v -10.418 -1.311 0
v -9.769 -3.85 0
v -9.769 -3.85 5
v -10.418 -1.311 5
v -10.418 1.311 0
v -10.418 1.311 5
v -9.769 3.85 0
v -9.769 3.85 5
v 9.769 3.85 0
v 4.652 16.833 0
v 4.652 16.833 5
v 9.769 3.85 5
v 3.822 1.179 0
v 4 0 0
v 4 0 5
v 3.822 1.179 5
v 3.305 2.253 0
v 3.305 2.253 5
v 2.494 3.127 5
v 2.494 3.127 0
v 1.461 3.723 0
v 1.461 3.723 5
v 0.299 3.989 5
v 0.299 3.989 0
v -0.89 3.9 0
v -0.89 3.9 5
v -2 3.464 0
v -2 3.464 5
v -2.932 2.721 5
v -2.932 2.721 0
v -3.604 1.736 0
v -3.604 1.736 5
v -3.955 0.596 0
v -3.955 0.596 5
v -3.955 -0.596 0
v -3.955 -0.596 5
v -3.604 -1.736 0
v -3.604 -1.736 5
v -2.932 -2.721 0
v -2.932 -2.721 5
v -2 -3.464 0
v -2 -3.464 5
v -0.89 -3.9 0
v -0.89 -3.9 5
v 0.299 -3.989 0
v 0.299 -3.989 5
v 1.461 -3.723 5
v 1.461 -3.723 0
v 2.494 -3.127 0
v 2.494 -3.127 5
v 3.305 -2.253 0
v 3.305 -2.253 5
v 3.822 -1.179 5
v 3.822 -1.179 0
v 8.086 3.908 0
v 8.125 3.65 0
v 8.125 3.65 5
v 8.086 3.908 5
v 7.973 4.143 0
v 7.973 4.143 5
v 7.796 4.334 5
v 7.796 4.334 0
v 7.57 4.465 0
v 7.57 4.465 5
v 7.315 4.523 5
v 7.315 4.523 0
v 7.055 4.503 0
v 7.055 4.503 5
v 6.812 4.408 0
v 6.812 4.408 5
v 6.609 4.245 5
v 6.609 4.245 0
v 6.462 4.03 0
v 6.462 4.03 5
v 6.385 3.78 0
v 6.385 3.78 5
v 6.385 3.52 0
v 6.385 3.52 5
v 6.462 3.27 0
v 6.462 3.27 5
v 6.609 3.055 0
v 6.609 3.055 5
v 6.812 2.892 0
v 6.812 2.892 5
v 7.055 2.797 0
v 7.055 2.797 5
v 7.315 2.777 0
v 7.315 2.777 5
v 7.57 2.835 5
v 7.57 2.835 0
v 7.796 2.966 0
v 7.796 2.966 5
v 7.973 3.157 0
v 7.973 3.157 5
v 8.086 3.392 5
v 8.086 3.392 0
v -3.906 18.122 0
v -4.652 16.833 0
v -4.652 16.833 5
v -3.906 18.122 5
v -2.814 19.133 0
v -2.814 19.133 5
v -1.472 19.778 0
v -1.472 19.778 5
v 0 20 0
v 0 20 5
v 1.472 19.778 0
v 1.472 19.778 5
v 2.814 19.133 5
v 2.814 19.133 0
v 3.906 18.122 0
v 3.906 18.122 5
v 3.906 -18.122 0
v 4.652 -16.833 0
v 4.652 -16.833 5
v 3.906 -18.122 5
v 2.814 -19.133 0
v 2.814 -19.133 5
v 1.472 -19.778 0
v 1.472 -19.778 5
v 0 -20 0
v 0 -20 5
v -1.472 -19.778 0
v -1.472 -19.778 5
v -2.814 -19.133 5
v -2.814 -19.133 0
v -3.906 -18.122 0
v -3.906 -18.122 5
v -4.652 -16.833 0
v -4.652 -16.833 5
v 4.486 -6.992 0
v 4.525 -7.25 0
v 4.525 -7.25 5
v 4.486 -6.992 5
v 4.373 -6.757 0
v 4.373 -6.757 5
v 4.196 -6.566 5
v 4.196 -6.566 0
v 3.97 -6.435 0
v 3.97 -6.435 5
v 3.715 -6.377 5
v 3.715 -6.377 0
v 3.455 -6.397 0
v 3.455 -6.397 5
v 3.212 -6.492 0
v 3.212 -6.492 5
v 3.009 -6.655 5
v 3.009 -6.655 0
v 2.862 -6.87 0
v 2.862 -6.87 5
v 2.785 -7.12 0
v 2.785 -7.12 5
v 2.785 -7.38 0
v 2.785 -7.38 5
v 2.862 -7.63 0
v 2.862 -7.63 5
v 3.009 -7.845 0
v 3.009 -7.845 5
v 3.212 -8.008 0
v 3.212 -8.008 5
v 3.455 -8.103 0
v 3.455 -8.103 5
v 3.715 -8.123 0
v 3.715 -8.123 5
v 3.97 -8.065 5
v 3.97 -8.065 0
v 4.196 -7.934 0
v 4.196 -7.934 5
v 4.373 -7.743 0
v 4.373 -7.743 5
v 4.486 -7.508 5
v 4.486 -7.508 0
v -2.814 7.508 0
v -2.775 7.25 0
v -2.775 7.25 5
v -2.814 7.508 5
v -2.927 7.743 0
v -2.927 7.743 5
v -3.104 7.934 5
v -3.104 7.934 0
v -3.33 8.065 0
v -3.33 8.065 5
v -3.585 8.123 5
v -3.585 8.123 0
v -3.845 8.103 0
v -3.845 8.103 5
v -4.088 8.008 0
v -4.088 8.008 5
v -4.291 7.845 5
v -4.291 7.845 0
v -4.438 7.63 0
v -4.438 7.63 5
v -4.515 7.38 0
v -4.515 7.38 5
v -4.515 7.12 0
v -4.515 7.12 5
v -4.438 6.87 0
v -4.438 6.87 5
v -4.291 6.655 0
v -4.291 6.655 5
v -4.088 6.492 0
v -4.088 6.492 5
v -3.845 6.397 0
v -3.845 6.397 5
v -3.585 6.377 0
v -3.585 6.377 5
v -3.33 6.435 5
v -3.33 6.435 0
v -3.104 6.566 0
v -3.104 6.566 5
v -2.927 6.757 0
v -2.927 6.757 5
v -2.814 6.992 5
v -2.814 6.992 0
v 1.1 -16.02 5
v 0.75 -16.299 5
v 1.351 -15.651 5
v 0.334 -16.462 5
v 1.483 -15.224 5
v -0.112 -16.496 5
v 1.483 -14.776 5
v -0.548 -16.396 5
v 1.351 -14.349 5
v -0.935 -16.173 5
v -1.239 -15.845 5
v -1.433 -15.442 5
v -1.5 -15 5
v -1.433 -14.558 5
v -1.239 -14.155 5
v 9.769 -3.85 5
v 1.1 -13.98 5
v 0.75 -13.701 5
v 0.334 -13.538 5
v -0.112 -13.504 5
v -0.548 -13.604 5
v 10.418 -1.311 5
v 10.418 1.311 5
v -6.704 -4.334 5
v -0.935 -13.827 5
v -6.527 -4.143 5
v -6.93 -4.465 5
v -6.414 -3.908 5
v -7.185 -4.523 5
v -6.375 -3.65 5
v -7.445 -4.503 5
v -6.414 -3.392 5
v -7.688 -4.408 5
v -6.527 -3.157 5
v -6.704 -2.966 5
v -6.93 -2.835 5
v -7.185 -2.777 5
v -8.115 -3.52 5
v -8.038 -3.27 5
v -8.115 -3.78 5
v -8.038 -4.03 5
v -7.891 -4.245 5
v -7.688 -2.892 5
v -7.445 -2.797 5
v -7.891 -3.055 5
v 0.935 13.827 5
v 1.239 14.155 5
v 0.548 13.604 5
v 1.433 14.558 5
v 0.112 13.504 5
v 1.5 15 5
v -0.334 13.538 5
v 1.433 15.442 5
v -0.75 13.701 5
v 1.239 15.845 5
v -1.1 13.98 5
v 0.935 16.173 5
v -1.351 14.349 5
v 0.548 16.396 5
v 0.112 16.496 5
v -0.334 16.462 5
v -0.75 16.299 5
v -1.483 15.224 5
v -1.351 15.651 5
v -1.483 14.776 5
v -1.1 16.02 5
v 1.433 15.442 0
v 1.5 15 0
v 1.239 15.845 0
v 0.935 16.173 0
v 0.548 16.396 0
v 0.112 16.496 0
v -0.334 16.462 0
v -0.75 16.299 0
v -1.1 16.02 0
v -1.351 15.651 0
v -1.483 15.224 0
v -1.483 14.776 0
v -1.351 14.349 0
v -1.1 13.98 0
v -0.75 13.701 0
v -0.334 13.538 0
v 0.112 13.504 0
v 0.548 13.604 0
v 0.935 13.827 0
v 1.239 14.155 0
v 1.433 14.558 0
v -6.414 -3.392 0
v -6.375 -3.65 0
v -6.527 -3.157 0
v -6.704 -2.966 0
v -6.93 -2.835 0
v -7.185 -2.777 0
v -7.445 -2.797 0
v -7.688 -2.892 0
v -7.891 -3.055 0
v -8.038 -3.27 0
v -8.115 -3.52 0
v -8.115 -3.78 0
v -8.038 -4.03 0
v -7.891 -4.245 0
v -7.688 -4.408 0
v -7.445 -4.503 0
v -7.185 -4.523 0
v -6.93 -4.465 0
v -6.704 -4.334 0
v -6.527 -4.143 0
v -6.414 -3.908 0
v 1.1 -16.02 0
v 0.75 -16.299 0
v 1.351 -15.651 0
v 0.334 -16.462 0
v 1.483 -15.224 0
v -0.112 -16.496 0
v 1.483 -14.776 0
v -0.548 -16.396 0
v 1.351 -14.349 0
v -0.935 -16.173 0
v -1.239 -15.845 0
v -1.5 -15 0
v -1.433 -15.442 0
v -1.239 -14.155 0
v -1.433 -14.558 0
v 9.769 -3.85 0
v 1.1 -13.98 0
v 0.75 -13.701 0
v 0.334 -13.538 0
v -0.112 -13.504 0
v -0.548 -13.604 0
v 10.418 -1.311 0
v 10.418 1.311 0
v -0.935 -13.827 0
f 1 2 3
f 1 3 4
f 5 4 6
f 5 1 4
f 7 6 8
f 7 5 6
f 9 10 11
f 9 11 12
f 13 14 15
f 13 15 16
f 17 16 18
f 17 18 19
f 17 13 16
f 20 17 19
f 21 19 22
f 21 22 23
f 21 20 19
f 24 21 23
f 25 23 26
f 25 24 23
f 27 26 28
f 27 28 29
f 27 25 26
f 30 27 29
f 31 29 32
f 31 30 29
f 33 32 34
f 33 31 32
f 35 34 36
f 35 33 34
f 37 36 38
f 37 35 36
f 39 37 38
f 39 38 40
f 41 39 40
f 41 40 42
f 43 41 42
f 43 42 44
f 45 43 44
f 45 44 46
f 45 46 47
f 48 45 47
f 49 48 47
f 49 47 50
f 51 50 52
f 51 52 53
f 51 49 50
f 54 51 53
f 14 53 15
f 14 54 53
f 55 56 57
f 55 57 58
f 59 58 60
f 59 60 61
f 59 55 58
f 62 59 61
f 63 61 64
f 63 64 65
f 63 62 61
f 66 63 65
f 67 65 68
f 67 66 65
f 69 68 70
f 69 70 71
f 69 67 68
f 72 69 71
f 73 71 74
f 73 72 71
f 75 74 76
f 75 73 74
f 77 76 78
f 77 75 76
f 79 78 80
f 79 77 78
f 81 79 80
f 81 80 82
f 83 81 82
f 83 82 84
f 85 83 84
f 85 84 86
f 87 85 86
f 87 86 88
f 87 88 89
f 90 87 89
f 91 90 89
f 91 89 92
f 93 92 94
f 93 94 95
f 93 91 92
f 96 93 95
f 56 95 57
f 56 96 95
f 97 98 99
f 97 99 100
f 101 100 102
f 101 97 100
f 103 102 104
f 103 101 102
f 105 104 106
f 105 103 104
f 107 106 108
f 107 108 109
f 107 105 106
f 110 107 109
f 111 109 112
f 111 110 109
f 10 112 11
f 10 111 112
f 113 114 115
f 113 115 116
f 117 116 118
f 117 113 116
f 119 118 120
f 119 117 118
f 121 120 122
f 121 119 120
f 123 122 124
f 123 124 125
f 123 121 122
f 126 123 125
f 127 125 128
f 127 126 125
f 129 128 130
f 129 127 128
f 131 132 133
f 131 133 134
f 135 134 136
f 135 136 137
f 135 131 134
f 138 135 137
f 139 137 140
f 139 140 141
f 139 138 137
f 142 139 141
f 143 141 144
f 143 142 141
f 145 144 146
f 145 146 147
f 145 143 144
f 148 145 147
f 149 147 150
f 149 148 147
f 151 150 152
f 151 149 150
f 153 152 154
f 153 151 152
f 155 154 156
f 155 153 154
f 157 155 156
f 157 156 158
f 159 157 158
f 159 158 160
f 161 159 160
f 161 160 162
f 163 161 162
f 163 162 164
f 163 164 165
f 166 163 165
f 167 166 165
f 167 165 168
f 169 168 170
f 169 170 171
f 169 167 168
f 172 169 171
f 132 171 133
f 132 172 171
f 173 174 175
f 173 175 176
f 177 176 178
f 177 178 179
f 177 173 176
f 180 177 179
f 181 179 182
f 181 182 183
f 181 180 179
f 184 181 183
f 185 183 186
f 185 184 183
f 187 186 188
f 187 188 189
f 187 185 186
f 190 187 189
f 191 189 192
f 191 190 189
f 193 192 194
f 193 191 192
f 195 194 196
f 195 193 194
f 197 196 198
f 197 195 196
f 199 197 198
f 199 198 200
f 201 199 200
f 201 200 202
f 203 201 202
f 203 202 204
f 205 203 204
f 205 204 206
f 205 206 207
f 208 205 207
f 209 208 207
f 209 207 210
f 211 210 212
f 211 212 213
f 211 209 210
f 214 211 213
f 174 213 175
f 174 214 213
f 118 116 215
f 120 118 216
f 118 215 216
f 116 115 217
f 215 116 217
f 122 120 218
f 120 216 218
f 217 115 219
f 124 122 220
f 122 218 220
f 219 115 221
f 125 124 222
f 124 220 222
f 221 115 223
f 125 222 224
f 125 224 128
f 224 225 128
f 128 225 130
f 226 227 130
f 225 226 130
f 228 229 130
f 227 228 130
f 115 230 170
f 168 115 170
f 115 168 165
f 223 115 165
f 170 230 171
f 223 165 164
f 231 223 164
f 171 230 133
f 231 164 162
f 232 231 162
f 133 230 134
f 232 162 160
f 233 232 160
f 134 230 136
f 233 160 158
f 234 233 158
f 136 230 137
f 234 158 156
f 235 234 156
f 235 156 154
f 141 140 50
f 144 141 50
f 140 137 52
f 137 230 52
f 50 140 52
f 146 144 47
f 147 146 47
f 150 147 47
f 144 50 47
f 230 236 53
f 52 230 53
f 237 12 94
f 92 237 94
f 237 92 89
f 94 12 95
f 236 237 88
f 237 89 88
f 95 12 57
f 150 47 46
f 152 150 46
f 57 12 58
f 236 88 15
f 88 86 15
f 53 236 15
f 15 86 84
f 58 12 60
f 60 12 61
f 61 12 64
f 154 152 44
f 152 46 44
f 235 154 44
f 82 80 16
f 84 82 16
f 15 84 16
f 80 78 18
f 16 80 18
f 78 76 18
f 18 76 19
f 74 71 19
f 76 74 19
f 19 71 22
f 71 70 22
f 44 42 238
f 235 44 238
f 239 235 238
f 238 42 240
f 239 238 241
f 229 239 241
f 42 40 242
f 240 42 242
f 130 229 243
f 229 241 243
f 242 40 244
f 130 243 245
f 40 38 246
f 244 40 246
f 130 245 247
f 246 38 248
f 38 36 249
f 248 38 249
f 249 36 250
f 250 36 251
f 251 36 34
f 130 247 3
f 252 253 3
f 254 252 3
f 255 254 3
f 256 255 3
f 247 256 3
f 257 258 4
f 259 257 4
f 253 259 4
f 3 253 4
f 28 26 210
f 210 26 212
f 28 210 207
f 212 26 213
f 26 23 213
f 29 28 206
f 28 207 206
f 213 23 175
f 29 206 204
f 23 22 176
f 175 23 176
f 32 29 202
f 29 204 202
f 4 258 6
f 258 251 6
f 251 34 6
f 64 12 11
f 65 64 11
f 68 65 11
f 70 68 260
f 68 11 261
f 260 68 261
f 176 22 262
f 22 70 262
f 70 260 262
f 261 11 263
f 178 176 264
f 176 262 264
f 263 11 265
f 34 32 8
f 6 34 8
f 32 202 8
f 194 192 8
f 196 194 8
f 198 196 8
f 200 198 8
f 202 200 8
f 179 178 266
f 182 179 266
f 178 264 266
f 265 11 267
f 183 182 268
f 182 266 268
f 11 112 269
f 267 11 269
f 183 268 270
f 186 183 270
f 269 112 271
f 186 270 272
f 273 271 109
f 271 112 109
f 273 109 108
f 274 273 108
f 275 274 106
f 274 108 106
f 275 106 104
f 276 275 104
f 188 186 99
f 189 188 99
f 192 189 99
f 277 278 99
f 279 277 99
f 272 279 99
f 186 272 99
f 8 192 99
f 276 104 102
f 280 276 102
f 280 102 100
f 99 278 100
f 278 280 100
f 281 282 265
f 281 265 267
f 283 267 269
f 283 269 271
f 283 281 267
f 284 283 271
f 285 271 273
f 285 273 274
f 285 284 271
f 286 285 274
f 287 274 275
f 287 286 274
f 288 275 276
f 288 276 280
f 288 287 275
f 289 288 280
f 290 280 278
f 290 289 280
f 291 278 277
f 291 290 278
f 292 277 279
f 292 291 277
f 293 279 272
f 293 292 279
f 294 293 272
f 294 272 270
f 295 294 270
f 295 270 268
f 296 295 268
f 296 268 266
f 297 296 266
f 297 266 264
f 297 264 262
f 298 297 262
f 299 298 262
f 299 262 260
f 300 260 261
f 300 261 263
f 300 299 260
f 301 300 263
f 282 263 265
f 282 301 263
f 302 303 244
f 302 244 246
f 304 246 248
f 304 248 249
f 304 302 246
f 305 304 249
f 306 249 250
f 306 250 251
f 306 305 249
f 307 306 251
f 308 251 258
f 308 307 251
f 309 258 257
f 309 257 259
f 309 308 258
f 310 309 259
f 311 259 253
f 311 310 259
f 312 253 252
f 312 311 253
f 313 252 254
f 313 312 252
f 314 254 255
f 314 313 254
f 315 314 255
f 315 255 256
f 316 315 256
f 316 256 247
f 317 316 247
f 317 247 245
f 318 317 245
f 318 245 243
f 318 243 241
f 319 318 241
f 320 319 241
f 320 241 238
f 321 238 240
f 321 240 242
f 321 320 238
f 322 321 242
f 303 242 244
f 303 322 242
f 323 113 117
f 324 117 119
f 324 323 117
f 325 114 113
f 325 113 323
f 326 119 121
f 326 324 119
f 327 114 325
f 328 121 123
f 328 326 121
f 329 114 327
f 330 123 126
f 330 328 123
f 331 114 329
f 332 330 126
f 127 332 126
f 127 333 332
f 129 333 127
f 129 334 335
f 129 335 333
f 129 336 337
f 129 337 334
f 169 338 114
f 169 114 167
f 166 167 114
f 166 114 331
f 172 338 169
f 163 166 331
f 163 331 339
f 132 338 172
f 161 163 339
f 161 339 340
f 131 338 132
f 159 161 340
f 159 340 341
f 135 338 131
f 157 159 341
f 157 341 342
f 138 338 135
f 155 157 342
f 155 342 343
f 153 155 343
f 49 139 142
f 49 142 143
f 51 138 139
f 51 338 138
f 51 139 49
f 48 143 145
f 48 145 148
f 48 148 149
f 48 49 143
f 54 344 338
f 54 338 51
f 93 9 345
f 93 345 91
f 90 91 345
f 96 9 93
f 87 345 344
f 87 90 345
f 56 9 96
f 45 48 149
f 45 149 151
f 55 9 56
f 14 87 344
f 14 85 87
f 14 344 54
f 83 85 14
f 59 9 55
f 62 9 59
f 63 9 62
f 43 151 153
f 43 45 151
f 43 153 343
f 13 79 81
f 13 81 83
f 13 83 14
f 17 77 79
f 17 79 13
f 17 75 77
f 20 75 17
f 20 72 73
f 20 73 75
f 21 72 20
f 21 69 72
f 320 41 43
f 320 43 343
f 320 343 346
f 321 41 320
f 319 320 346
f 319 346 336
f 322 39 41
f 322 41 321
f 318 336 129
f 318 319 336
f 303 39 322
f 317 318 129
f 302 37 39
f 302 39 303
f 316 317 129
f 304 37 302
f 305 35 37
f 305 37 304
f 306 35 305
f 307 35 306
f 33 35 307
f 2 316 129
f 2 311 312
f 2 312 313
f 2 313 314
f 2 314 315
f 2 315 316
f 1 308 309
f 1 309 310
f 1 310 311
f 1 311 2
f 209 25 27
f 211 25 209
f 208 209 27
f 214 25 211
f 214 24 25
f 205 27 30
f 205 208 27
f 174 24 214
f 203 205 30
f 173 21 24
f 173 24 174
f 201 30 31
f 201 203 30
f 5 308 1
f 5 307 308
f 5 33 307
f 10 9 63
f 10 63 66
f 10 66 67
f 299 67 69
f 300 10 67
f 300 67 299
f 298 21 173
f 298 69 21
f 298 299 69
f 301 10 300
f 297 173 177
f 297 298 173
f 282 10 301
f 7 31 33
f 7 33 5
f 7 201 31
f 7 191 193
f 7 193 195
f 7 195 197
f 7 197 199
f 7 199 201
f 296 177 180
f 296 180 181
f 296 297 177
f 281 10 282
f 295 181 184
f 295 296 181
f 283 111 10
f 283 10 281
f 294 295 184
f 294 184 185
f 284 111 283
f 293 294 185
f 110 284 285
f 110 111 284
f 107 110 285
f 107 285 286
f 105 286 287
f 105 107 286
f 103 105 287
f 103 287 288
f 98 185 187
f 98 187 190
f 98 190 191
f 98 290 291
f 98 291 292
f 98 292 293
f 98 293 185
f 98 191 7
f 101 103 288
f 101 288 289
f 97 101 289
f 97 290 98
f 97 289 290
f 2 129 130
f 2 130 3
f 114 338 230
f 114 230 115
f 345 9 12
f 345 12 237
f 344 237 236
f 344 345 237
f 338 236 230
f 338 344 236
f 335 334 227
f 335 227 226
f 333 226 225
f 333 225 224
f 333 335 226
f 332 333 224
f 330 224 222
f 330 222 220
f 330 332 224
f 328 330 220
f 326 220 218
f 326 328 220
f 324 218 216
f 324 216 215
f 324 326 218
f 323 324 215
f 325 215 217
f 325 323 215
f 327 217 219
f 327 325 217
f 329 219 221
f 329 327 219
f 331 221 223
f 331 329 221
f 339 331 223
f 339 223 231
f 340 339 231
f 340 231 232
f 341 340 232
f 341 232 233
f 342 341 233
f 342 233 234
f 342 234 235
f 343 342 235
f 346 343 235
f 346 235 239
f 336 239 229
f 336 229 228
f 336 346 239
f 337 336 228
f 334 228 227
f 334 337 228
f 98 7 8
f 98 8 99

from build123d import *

# Parameters (mm, degrees)
ESQUISSE1_R        = 4
ESQUISSE1_R_2      = 0.875
ESQUISSE1_R_3      = 1.5
BOSS_EXTRU_1_DEPTH = 5


with BuildPart() as part:
    # Esquisse1 → Boss.-Extru.1 (new body)
    with BuildSketch(Plane.XY):
        with BuildLine():
            Line((-9.768700016, 3.85), (-4.651761912, 16.833333333))
            ThreePointArc((-4.651761912, 16.833333333), (0, 20), (4.651761912, 16.833333333))
            Line((4.651761912, 16.833333333), (9.768700016, 3.85))
            ThreePointArc((9.768700016, 3.85), (10.5, 0), (9.768700016, -3.85))
            Line((9.768700016, -3.85), (4.651761912, -16.833333333))
            ThreePointArc((4.651761912, -16.833333333), (0, -20), (-4.651761912, -16.833333333))
            Line((-4.651761912, -16.833333333), (-9.768700016, -3.85))
            ThreePointArc((-9.768700016, -3.85), (-10.5, 0), (-9.768700016, 3.85))
        make_face()
        Circle(ESQUISSE1_R, mode=Mode.SUBTRACT)
        with Locations((7.25, 3.65)):
            Circle(ESQUISSE1_R_2, mode=Mode.SUBTRACT)
        with Locations((3.65, -7.25)):
            Circle(ESQUISSE1_R_2, mode=Mode.SUBTRACT)
        with Locations((-7.25, -3.65)):
            Circle(ESQUISSE1_R_2, mode=Mode.SUBTRACT)
        with Locations((-3.65, 7.25)):
            Circle(ESQUISSE1_R_2, mode=Mode.SUBTRACT)
        with Locations((0, 15)):
            Circle(ESQUISSE1_R_3, mode=Mode.SUBTRACT)
        with Locations(Location((0, -15, 0), (0, 0, 180))):
            Circle(ESQUISSE1_R_3, mode=Mode.SUBTRACT)
    extrude(amount=BOSS_EXTRU_1_DEPTH)


solid = part.part
